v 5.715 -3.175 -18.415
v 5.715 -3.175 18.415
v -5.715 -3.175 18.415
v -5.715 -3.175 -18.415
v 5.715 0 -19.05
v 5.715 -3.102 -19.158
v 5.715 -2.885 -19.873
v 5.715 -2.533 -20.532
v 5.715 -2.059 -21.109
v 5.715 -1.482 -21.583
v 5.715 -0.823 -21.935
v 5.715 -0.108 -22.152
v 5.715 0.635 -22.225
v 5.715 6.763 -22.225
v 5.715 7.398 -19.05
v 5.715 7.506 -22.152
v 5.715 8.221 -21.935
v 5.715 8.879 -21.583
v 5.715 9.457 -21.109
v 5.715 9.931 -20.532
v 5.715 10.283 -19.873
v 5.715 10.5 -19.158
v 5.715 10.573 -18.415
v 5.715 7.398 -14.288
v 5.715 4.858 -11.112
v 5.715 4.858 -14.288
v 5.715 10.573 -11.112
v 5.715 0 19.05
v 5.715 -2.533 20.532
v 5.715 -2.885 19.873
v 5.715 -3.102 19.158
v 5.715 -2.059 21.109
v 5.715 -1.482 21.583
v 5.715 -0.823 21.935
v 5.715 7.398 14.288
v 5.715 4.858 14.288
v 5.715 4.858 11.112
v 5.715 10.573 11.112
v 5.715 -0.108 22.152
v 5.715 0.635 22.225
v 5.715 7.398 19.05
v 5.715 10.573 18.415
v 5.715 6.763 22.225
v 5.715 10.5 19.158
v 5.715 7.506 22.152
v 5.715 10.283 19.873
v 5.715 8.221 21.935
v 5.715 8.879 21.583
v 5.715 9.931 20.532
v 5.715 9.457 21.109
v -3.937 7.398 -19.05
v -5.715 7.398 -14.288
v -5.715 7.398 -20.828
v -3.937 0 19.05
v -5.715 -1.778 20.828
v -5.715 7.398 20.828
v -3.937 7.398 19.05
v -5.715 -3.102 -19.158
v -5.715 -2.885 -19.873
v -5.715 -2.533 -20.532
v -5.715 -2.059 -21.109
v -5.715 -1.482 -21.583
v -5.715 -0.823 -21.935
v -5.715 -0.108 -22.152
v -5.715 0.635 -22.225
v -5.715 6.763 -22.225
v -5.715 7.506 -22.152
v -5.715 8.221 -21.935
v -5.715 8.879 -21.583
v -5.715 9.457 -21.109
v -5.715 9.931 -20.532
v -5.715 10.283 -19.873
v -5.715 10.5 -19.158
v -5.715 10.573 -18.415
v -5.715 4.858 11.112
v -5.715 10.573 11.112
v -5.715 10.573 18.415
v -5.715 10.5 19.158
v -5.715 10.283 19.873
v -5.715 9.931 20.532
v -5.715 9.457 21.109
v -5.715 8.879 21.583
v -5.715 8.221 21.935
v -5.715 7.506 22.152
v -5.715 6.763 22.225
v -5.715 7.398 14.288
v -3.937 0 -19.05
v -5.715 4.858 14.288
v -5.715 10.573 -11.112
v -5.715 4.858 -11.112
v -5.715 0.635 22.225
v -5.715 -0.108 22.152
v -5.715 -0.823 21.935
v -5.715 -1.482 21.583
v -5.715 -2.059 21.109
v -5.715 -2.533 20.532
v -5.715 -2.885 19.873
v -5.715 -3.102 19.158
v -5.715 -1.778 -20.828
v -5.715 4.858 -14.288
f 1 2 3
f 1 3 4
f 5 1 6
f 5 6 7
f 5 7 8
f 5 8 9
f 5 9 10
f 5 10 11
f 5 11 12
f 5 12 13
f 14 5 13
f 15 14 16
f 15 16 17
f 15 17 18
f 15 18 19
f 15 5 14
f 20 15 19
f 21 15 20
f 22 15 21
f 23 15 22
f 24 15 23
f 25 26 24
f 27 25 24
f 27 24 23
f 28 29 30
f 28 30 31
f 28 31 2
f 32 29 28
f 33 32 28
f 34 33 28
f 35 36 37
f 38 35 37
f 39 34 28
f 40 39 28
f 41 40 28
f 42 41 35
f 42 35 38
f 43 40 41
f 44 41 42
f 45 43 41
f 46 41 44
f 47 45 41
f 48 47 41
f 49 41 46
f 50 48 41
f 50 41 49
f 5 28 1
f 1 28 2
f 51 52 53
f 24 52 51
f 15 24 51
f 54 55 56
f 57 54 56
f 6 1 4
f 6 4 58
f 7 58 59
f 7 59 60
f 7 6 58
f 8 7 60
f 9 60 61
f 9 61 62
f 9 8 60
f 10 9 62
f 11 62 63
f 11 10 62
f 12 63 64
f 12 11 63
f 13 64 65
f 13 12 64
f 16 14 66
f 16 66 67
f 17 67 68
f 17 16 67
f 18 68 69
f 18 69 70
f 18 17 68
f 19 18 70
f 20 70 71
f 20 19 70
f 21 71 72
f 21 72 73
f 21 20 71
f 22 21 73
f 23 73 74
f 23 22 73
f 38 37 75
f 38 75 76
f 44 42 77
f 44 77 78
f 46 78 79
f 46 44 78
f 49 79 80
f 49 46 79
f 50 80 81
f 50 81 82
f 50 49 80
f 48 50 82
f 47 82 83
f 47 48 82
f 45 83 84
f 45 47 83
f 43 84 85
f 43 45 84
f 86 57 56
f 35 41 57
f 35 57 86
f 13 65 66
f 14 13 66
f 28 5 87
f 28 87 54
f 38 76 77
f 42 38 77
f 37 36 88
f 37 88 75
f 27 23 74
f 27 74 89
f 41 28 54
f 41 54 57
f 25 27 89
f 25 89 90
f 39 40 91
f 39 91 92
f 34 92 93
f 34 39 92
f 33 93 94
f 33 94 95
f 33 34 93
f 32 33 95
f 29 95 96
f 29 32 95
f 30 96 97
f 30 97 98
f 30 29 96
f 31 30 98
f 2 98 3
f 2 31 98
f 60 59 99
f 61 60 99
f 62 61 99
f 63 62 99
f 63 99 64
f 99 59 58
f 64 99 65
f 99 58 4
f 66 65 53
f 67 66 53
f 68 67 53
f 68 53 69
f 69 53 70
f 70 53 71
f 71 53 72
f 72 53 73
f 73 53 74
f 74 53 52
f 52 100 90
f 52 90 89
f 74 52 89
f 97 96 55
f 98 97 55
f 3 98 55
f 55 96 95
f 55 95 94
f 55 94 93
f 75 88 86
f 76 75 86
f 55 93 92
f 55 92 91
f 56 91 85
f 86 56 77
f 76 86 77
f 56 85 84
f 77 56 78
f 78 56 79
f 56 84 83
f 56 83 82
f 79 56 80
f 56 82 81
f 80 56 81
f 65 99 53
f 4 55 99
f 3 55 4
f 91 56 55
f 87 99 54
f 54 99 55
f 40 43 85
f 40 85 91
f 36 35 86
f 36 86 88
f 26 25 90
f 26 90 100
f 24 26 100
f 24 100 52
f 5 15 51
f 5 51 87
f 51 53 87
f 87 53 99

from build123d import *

# Parameters (mm, degrees)
F1_DEPTH = 5.715
F2_SIZE  = 1.778


with BuildPart() as f1:
    # F0 (on Right) → F1 (new body, symmetric)
    with BuildSketch(Plane.YZ):
        with BuildLine():
            Line((0, -19.05), (0, 0))
            Line((0, 0), (0, 19.05))
            Line((0, 19.05), (7.39775, 19.05))
            Line((7.39775, 19.05), (7.39775, 14.2875))
            Line((7.39775, 14.2875), (4.85775, 14.2875))
            Line((4.85775, 14.2875), (4.85775, 11.1125))
            Line((4.85775, 11.1125), (10.57275, 11.1125))
            Line((10.57275, 11.1125), (10.57275, 18.415))
            ThreePointArc((10.57275, 18.415), (9.456827, 21.109077), (6.76275, 22.225))
            Line((6.76275, 22.225), (0.635, 22.225))
            ThreePointArc((0.635, 22.225), (-2.059077, 21.109077), (-3.175, 18.415))
            Line((-3.175, 18.415), (-3.175, 0))
            Line((-3.175, 0), (-3.175, -18.415))
            ThreePointArc((-3.175, -18.415), (-2.059077, -21.109077), (0.635, -22.225))
            Line((0.635, -22.225), (6.76275, -22.225))
            ThreePointArc((6.76275, -22.225), (9.456827, -21.109077), (10.57275, -18.415))
            Line((10.57275, -18.415), (10.57275, -11.1125))
            Line((10.57275, -11.1125), (4.85775, -11.1125))
            Line((4.85775, -11.1125), (4.85775, -14.2875))
            Line((4.85775, -14.2875), (7.39775, -14.2875))
            Line((7.39775, -14.2875), (7.39775, -19.05))
            Line((7.39775, -19.05), (0, -19.05))
        make_face()
    extrude(amount=F1_DEPTH, both=True)

    # F2
    f2_edges = [f1.edges().sort_by_distance(p)[0] for p in [
        (-5.715, 3.698875, -19.05),
        (-5.715, 0, 0),
        (-5.715, 3.698875, 19.05),
    ]]
    chamfer(f2_edges, length=F2_SIZE)


solid = f1.part
